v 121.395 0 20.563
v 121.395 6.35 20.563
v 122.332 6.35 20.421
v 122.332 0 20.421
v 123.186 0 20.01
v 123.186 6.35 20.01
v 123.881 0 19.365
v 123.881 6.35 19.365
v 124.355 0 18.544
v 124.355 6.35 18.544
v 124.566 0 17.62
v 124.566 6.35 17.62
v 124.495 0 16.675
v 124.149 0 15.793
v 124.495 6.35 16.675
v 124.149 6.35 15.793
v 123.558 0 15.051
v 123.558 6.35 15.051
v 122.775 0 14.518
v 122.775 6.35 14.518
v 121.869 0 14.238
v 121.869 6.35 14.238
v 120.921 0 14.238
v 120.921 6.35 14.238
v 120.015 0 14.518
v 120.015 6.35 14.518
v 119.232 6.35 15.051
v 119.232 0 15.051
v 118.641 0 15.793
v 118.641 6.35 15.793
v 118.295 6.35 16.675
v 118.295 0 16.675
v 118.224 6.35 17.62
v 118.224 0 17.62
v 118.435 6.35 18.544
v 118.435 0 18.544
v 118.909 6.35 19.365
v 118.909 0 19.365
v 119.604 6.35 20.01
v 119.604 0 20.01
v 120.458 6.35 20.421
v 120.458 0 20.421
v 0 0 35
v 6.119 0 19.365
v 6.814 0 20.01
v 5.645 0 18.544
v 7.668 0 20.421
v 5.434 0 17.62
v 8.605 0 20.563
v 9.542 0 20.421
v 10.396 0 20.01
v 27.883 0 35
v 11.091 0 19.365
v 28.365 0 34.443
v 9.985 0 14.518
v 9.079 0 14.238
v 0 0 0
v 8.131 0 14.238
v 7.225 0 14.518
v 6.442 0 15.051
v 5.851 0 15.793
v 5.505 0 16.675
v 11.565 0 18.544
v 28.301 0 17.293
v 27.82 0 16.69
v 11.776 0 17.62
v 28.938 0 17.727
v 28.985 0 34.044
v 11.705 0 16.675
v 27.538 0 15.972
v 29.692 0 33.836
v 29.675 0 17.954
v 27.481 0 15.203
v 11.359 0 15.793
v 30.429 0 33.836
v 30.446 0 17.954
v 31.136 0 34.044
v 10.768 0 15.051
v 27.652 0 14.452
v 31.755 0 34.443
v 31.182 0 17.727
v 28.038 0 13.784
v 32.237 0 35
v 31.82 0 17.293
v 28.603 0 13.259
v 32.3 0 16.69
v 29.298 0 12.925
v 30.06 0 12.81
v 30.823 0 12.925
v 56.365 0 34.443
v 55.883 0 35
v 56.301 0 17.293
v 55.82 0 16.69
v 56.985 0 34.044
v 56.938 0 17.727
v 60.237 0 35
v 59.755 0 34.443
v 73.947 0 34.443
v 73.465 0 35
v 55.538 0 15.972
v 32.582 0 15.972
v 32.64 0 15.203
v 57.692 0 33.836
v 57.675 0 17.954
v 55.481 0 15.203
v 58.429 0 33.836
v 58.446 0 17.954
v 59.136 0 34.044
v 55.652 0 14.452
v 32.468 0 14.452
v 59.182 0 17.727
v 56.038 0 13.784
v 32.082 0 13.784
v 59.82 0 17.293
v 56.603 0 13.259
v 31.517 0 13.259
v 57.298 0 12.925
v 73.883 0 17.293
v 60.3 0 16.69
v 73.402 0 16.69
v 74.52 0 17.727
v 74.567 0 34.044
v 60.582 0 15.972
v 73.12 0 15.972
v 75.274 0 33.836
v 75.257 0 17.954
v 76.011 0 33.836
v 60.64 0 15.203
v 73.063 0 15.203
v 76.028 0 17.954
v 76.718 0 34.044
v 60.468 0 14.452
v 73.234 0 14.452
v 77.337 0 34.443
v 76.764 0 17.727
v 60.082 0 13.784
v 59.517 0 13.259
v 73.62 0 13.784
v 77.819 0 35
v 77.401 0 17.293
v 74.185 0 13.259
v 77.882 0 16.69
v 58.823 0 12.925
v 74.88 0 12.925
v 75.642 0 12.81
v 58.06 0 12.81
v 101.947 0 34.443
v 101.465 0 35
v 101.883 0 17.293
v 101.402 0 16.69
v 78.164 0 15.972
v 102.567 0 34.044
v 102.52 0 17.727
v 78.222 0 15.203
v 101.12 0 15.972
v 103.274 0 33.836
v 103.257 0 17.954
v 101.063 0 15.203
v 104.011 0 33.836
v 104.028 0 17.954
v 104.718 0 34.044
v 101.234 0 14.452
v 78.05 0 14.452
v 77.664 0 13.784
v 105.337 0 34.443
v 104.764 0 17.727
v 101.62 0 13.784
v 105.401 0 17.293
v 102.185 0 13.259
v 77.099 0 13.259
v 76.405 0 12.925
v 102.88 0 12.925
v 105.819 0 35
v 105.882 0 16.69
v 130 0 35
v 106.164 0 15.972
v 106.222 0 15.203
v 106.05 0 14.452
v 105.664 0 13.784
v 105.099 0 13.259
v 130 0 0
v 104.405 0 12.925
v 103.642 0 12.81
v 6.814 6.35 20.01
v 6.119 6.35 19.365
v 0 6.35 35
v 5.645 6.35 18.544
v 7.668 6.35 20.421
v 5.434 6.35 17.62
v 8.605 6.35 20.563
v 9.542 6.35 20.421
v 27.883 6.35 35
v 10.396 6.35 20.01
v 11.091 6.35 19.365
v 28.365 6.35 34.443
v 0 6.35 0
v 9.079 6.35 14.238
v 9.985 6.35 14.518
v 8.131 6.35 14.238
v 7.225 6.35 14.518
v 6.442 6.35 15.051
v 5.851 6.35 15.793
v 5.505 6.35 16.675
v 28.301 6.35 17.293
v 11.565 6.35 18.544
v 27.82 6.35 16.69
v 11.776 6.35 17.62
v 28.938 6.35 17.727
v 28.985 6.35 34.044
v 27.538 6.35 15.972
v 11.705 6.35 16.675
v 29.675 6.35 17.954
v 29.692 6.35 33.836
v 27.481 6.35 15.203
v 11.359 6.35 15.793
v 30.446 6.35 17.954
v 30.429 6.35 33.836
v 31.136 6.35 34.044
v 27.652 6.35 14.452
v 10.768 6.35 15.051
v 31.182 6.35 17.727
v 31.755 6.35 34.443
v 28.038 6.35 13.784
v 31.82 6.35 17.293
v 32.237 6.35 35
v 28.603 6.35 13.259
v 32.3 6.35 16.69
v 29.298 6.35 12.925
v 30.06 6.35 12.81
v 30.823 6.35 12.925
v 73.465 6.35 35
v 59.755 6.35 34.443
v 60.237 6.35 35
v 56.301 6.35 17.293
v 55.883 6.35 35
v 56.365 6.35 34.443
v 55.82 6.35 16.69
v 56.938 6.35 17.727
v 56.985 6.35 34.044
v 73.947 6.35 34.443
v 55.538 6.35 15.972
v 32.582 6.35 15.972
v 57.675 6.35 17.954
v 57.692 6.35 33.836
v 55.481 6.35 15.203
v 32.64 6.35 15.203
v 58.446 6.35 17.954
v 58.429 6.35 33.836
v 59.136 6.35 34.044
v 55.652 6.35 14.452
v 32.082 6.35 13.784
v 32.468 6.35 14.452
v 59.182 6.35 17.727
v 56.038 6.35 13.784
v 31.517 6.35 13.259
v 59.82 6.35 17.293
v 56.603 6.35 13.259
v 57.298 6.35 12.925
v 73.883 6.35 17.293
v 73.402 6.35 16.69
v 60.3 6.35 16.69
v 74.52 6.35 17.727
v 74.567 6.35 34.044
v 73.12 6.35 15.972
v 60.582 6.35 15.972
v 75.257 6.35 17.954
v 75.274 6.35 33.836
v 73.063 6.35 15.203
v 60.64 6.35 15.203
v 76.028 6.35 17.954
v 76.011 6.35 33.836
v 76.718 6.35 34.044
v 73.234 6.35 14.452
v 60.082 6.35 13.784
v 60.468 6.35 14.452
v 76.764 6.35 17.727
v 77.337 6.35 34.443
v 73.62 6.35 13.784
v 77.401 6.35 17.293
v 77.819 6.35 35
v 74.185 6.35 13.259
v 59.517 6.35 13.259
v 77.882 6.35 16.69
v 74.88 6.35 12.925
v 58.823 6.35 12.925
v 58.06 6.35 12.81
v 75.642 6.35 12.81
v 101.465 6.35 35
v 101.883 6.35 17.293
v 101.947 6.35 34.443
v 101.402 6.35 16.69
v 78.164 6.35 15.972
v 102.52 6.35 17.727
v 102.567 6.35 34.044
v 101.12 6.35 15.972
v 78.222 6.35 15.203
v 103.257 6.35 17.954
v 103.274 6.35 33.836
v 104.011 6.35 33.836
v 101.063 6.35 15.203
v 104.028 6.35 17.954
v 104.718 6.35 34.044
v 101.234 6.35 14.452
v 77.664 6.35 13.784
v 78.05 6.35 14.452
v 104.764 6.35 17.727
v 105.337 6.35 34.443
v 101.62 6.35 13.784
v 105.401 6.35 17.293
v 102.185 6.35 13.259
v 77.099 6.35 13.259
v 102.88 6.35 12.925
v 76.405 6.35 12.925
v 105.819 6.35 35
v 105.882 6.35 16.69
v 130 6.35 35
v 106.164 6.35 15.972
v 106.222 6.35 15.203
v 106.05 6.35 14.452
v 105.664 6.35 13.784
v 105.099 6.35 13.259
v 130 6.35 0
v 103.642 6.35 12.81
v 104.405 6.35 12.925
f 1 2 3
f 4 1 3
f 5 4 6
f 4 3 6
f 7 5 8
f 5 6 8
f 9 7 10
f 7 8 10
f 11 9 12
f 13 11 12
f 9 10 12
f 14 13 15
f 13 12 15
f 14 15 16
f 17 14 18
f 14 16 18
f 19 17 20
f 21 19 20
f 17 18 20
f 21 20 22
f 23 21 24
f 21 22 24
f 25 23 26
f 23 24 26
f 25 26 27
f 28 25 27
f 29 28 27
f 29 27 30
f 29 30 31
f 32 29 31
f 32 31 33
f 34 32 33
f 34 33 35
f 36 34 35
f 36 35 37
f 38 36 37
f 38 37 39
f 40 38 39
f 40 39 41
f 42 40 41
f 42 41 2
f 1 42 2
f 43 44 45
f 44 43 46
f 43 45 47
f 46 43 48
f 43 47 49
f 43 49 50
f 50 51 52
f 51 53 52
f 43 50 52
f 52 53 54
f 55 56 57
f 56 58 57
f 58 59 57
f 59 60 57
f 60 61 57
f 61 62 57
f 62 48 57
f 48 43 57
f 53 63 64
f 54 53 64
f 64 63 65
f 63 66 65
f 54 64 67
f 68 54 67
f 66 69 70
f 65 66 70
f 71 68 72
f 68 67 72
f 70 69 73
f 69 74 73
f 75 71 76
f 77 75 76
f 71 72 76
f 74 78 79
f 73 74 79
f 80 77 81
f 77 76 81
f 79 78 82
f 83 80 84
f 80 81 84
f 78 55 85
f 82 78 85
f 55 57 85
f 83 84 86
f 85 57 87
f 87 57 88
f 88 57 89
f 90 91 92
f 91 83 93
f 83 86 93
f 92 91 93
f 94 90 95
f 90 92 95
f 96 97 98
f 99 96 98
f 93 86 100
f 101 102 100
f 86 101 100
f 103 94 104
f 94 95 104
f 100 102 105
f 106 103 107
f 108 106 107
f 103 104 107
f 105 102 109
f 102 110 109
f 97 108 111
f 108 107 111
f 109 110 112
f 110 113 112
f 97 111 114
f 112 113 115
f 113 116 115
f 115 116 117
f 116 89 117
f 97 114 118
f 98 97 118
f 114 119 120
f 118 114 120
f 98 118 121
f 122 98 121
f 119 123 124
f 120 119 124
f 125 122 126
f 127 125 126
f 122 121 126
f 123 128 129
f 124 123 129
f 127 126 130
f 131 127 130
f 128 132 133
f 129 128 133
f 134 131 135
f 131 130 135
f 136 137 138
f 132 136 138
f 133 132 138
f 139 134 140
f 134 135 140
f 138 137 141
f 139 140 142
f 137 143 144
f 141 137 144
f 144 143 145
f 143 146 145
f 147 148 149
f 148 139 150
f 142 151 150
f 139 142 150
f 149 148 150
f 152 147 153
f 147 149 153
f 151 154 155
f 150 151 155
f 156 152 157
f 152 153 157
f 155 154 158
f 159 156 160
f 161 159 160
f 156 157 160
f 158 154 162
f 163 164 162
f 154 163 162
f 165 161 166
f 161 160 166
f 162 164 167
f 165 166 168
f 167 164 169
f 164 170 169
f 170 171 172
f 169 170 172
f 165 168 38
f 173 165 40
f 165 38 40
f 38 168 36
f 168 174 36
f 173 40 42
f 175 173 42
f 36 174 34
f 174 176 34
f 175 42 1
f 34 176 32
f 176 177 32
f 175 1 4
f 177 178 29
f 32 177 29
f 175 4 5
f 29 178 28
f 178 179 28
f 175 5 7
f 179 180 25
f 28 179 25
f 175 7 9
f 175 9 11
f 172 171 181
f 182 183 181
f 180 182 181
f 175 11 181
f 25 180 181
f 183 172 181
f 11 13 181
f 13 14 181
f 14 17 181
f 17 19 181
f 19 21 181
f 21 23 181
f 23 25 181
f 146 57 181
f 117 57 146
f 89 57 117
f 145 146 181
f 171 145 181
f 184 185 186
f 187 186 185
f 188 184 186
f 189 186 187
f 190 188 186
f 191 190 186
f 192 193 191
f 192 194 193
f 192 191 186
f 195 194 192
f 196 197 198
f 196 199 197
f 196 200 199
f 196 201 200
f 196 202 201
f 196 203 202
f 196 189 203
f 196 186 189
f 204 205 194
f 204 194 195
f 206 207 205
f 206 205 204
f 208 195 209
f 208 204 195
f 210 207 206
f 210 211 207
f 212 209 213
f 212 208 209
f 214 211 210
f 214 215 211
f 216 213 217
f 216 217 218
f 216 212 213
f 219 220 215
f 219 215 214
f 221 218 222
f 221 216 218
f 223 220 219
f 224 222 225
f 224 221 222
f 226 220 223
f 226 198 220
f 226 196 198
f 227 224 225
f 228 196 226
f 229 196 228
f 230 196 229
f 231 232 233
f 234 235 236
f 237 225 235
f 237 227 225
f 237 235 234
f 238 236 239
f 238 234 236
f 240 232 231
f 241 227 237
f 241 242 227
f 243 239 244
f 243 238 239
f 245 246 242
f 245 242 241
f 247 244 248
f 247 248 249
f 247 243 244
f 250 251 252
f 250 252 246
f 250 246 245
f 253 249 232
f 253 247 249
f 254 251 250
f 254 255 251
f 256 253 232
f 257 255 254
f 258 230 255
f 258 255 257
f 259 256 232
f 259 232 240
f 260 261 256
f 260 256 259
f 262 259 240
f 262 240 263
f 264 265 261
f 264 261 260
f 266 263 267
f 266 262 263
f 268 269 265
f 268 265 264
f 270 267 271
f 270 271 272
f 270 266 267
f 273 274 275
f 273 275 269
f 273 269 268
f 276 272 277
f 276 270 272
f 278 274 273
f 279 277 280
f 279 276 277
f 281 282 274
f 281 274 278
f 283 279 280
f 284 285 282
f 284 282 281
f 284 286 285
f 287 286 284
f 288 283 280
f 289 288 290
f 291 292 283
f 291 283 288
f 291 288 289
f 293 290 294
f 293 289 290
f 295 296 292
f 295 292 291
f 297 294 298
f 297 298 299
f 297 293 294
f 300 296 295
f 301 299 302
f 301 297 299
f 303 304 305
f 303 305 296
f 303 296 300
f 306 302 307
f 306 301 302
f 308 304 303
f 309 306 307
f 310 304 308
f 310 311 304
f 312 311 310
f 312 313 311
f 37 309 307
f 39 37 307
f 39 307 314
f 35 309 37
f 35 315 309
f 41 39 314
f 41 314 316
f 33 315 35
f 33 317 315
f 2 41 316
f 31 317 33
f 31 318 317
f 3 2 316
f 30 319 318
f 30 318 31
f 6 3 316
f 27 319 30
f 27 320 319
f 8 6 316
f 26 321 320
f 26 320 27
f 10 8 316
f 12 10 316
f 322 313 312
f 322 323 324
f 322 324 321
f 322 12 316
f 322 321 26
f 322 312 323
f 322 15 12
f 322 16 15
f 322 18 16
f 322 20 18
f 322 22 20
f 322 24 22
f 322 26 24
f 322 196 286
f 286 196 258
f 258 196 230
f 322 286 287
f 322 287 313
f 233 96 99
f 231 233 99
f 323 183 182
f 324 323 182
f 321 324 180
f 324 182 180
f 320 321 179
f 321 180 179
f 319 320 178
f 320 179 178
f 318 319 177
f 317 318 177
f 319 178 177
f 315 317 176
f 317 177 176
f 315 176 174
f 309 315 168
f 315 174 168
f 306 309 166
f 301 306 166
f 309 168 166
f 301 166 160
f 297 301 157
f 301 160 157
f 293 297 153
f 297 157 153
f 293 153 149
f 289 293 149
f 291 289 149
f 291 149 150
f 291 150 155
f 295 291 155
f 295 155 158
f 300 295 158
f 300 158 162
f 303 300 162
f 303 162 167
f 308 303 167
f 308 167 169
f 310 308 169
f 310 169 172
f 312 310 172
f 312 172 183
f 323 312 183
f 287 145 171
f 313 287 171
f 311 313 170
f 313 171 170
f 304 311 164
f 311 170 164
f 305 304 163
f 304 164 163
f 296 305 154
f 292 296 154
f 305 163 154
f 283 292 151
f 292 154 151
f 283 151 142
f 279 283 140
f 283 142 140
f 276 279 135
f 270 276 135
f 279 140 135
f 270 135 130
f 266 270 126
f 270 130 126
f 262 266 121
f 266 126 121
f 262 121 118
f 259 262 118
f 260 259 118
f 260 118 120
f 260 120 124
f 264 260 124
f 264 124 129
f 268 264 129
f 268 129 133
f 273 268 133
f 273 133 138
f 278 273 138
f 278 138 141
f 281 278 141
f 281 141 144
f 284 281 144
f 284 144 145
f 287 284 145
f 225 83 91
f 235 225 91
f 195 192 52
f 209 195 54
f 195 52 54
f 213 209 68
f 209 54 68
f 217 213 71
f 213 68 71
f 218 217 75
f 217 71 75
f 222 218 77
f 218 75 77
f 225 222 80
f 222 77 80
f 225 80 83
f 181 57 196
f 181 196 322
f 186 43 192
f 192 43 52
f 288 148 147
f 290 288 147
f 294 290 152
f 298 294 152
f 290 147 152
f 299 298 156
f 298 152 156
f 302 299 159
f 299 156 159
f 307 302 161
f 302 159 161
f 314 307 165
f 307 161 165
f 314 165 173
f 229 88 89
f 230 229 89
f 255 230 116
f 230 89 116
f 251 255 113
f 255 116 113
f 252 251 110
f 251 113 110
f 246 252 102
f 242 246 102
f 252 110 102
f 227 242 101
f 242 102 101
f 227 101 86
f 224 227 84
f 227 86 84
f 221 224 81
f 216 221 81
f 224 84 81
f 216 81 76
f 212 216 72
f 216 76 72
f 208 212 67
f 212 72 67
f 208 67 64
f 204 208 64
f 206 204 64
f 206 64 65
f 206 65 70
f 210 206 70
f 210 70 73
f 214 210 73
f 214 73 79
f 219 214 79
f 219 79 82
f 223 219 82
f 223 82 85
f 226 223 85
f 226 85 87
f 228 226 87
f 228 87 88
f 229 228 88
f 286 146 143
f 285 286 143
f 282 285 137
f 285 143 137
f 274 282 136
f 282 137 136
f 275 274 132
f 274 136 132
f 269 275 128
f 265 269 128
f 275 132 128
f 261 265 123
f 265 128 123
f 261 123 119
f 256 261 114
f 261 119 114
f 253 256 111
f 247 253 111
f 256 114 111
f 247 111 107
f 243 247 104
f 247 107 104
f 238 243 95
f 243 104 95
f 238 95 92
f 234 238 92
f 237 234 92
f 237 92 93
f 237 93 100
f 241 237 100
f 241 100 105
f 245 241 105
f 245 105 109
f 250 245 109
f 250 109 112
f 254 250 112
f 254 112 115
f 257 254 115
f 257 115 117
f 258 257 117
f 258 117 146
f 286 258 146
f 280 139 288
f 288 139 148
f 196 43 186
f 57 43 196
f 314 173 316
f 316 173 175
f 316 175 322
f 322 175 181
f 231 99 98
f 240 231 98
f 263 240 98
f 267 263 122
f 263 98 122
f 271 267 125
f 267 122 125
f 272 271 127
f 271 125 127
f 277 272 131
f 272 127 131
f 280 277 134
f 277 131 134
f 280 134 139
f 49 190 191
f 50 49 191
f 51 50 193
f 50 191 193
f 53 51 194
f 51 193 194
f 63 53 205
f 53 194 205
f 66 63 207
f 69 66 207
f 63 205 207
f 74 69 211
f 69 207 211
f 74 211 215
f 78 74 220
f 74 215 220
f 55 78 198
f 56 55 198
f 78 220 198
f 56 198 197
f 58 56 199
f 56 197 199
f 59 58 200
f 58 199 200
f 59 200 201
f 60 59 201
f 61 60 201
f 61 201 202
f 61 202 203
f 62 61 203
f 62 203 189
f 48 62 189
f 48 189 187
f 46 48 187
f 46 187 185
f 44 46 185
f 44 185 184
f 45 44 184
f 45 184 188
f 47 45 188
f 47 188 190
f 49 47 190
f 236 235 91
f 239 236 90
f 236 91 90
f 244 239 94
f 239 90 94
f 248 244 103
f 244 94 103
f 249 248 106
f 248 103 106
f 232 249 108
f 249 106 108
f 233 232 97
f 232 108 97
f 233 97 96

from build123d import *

# Parameters (mm, degrees)
SKETCH1_W           = 130
SKETCH1_H           = 35
BOSS_EXTRUDE1_DEPTH = 6.35
SKETCH5_R           = 3.18
CUT_EXTRUDE2_DEPTH  = 135.778790987
SKETCH8_R           = 2.58660254
CUT_EXTRUDE4_DEPTH  = 135.778790987


with BuildPart() as part:
    # Sketch1 → Boss-Extrude1 (new body)
    with BuildSketch(Plane(origin=(0, 0, 0), x_dir=(1, 0, 0), z_dir=(0, 1, 0))):
        with Locations((65, -17.5)):
            Rectangle(SKETCH1_W, SKETCH1_H)
    extrude(amount=BOSS_EXTRUDE1_DEPTH)

    # Sketch5 → Cut-Extrude2 (cut, through all)
    with BuildSketch(Plane(origin=(0, 6.35, 0), x_dir=(1, 0, 0), z_dir=(0, 1, 0))):
        with Locations(Location((8.605, -17.382603272, 0), (0, 0, 270))):
            Circle(SKETCH5_R)
        with Locations(Location((121.395, -17.382603272, 0), (0, 0, 270))):
            Circle(SKETCH5_R)
    extrude(amount=-CUT_EXTRUDE2_DEPTH, mode=Mode.SUBTRACT)

    # Sketch8 → Cut-Extrude4 (cut, through all)
    with BuildSketch(Plane.XZ):
        with Locations(Location((30.060178317, 15.396500763, 0), (0, 0, 270))):
            Circle(SKETCH8_R)
        with Locations((30.060178317, 36.396500763)):
            Circle(SKETCH8_R)
        with Locations((58.060178317, 36.396500763)):
            Circle(SKETCH8_R)
        with Locations(Location((58.060178317, 15.396500763, 0), (0, 0, 270))):
            Circle(SKETCH8_R)
        with Locations(Location((75.642130445, 15.396500763, 0), (0, 0, 270))):
            Circle(SKETCH8_R)
        with Locations((75.642130445, 36.396500763)):
            Circle(SKETCH8_R)
        with Locations(Location((103.642130445, 15.396500763, 0), (0, 0, 270))):
            Circle(SKETCH8_R)
        with Locations((103.642130445, 36.396500763)):
            Circle(SKETCH8_R)
    extrude(amount=-CUT_EXTRUDE4_DEPTH, mode=Mode.SUBTRACT)


solid = part.part
